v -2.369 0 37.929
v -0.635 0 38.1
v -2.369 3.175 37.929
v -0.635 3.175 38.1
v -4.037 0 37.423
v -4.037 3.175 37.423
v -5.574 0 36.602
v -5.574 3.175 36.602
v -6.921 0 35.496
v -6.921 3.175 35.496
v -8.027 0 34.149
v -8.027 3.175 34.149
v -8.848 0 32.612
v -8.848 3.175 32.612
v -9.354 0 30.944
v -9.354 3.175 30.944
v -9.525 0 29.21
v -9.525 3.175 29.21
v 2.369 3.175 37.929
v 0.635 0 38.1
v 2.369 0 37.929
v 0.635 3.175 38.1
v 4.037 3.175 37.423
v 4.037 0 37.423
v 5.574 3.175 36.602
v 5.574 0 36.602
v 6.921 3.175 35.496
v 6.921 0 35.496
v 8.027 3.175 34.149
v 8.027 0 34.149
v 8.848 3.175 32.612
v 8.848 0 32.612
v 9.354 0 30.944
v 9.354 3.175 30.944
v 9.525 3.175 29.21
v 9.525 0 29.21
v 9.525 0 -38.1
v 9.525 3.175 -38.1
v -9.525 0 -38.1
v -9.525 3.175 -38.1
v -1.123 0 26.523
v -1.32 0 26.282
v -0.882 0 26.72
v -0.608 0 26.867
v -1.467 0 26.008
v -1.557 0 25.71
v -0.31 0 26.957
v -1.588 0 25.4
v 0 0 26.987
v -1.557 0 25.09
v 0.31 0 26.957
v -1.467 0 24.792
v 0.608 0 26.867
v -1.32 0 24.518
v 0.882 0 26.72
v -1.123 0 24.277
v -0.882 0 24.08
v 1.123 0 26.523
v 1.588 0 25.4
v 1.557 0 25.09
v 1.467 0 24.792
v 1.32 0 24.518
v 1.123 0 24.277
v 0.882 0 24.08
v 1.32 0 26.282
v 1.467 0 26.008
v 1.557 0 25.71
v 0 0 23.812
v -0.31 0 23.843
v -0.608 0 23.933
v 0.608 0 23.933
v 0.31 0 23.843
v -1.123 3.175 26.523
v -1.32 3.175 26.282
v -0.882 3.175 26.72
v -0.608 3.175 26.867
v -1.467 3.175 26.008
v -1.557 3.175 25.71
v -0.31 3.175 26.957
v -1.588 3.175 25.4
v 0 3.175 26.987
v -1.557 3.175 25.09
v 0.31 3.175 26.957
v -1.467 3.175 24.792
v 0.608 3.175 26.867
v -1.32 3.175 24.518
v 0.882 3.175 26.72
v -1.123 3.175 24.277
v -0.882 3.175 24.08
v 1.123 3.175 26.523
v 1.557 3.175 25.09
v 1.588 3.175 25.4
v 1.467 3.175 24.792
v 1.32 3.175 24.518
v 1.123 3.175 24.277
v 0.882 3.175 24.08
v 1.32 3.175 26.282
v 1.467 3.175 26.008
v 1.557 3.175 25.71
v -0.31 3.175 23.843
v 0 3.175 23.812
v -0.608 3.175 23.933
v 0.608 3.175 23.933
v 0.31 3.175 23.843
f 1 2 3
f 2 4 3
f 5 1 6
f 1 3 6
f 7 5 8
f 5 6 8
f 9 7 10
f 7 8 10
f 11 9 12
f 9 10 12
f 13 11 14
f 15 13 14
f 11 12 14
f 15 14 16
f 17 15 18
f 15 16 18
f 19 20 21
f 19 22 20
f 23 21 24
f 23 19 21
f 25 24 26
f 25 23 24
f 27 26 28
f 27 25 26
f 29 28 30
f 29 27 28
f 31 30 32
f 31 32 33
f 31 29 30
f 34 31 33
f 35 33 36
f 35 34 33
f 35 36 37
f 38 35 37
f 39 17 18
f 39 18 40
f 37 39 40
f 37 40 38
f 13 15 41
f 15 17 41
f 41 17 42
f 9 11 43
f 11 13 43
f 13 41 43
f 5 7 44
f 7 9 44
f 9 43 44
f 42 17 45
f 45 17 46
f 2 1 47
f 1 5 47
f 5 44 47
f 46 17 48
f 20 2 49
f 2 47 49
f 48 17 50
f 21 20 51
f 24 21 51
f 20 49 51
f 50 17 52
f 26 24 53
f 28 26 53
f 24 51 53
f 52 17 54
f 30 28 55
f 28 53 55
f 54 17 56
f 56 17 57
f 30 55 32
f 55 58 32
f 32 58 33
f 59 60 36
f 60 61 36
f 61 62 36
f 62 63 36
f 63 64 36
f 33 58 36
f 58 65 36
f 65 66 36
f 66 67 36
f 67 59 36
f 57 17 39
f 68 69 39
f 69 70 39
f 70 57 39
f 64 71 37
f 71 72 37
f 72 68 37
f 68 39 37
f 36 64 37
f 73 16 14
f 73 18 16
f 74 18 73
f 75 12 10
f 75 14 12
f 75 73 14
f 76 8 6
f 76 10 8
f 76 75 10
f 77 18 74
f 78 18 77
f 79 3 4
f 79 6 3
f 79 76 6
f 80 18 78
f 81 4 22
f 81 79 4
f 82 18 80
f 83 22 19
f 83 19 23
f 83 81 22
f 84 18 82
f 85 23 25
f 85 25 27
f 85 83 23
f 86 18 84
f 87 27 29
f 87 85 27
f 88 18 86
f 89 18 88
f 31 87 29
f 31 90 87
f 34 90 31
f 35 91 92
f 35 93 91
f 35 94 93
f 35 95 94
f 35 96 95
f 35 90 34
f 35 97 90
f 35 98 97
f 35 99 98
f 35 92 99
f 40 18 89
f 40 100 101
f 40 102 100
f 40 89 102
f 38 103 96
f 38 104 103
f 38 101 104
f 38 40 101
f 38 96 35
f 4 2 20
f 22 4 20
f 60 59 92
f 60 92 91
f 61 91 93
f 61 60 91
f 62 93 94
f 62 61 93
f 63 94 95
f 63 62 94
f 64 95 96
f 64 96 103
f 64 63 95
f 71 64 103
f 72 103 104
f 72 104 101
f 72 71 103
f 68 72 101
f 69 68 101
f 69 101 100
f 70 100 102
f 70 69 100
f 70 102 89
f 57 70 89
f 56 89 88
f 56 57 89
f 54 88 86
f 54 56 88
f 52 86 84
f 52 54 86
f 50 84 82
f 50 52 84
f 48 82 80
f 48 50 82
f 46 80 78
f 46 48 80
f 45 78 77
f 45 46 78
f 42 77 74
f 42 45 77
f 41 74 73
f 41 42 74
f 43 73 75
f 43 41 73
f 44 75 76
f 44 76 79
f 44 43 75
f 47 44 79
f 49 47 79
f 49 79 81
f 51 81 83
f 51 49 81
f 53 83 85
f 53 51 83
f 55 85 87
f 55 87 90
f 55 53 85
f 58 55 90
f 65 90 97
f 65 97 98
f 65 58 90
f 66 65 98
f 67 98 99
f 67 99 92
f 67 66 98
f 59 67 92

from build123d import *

# Parameters (mm, degrees)
SKETCH2_W           = 19.05
SKETCH2_H           = 76.2
SKETCH2_R           = 1.5875
BOSS_EXTRUDE1_DEPTH = 3.175
FILLET1_R           = 8.89
FILLET2_R           = 8.89


with BuildPart() as part:
    # Sketch2 → Boss-Extrude1 (new body)
    with BuildSketch(Plane(origin=(0, 0, 0), x_dir=(1, 0, 0), z_dir=(0, 1, 0))):
        Rectangle(SKETCH2_W, SKETCH2_H)
        with Locations((0, -25.4)):
            Circle(SKETCH2_R, mode=Mode.SUBTRACT)
    extrude(amount=BOSS_EXTRUDE1_DEPTH)

    # Fillet1
    fillet1_edges = [part.edges().sort_by_distance(p)[0] for p in [
        (9.525, 1.5875, 38.1),
    ]]
    fillet(fillet1_edges, radius=FILLET1_R)

    # Fillet2
    fillet2_edges = [part.edges().sort_by_distance(p)[0] for p in [
        (-9.525, 1.5875, 38.1),
    ]]
    fillet(fillet2_edges, radius=FILLET2_R)


solid = part.part
